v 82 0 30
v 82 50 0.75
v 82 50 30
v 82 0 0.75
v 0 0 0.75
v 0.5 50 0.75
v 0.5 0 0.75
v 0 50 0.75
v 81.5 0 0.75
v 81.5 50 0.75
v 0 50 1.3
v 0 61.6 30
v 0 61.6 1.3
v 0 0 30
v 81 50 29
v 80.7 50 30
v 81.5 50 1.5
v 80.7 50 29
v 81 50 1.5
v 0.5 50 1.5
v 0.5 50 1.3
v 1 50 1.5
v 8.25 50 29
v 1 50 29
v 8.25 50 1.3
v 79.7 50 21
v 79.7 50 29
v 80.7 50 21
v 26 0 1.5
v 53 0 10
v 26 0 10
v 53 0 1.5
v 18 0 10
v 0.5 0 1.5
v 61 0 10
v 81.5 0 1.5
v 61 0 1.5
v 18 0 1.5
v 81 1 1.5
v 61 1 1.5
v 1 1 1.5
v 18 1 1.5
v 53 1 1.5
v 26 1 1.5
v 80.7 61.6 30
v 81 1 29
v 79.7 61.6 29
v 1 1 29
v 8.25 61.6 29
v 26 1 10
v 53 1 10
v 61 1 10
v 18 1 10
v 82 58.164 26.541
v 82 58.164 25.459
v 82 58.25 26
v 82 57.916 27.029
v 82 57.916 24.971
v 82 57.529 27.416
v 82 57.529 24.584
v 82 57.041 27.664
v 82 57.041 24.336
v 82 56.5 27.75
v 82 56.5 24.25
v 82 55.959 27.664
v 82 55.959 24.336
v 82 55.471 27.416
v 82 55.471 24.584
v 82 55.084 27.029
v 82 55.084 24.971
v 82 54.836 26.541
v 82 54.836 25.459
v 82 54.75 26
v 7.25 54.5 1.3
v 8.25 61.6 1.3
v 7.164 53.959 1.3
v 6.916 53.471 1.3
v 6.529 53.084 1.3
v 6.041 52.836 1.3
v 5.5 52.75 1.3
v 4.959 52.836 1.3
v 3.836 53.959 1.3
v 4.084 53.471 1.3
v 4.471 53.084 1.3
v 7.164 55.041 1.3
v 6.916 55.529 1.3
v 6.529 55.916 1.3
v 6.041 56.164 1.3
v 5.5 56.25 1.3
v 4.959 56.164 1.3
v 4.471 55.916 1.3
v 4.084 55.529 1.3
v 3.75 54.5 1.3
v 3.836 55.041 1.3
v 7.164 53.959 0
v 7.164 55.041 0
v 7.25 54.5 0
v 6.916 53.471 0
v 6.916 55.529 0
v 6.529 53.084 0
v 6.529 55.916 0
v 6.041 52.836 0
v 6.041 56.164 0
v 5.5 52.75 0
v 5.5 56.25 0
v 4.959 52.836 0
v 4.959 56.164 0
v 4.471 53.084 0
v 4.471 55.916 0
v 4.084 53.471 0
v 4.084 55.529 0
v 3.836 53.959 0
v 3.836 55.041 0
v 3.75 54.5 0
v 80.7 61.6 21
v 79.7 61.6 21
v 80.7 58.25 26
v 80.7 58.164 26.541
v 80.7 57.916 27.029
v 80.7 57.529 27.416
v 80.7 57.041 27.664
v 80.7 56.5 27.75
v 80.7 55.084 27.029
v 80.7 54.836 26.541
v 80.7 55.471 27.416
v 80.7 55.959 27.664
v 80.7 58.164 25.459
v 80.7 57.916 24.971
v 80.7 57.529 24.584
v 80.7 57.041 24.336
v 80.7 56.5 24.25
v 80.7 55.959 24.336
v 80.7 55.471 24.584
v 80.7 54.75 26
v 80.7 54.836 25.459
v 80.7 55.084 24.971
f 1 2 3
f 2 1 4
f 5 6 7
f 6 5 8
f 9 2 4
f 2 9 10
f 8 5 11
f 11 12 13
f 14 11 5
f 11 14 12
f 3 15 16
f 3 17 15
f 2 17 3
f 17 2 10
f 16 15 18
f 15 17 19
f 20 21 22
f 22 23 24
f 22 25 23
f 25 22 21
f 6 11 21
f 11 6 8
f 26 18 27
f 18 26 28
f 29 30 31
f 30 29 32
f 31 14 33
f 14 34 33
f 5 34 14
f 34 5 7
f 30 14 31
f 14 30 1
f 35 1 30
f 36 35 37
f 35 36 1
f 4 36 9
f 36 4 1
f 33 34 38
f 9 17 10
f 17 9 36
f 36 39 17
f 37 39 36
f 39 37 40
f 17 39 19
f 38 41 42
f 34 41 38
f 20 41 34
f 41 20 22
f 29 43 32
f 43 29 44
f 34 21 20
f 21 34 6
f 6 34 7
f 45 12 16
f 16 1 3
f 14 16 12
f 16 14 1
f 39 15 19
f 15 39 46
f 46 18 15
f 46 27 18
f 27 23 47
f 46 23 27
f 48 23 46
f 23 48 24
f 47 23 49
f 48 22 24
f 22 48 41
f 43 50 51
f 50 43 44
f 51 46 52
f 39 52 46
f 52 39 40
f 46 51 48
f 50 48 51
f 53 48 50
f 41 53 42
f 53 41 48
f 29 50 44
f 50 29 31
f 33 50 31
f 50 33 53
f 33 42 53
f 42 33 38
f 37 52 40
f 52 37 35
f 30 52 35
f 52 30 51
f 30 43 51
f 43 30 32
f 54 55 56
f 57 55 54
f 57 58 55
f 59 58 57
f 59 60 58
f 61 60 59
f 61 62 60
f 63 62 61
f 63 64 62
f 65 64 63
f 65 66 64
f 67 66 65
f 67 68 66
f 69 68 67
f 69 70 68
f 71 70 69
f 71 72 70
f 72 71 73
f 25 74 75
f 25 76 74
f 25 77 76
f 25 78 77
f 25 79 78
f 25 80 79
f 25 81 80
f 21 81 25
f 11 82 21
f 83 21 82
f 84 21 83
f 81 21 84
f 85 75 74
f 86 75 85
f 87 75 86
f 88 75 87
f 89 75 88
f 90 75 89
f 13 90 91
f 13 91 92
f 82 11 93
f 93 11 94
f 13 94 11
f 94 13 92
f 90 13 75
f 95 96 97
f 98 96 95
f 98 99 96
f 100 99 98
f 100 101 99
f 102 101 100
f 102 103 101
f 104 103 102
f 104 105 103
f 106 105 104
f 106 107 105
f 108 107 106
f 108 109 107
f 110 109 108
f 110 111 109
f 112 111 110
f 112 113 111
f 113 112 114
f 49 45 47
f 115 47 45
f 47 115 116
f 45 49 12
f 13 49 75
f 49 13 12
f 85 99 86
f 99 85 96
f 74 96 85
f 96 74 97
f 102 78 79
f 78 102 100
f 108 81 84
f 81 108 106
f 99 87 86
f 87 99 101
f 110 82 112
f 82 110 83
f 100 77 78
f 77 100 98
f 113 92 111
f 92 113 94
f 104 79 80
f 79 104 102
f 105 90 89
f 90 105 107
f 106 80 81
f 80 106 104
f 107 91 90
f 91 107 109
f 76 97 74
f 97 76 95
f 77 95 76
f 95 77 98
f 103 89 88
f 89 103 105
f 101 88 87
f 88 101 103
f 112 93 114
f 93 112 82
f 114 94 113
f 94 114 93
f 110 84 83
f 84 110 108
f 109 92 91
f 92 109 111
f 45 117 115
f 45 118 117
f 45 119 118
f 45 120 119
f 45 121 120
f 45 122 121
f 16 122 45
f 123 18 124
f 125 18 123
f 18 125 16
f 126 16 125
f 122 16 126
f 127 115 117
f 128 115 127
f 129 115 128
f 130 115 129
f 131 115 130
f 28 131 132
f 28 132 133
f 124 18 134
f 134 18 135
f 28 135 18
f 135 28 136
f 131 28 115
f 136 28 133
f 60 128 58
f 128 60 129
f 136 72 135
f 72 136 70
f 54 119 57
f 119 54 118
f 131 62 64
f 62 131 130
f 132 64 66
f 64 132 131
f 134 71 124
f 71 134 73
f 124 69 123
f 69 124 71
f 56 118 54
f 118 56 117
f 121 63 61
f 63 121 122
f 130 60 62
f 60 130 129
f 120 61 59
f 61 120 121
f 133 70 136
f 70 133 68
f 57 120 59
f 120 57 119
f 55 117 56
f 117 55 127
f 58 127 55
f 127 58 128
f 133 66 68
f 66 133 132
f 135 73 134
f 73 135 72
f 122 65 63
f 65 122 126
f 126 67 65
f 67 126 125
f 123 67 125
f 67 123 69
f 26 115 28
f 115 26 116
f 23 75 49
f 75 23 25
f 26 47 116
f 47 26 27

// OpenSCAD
// file: module-definitions.scad
include <definitions.scad>

/* Exposed part of the PSU */
module exposed_psu(){
	difference(){
		cube([psu_x, psu_y, psu_z_thick], center=false);
		translate([psu_x-base_hole_x,base_hole_y,-0.1]){
			cylinder(psu_z_thick+0.2,r=base_hole_r);
		}
	}

	difference(){
		translate([psu_x-psu_x_thick, 0, 0]){
			cube([psu_x_thick, psu_y, psu_z], center=false);
		}
		translate([psu_x-psu_x_thick-0.1, wall_hole_y, wall_hole_z]){
			rotate([0,90,0]){
				cylinder(psu_z_thick+0.2,r=base_hole_r);
			}
		}
	}
}
/* End of exposed part of PSU */

/* Base of PSU cover that is printed separately */
module cover_base(){
	cube([psu_x, cover_extra_y, empty_base_wall_thick/2]);
	translate([empty_wall_thick/2, 0, empty_base_wall_thick/2]){
        	cube([psu_x - empty_wall_thick, cover_extra_y, empty_base_wall_thick/2]);
	}
}
/* End of PSU cover base */
// file: definitions.scad
$fn=20;

//Measurements of the open part of the PSU with screw terminals
psu_x = 82;
psu_y = 11.6;
psu_z = 30;

//Set thickness of vertical wall on side of PSU
psu_x_thick = 1.3;

//Placeholder for base thickness
psu_z_thick = 1.3;

//Location of holes used for holding this cover
base_hole_x = 76.5;
base_hole_y = 4.5;
base_hole_r = 1.75;

wall_hole_y = 6.5;
wall_hole_z = 26;
wall_hole_r = 1.75;

//Variable for extra y distance
cover_extra_y = 50;

//Variables relating to the exposed PSU section of the cover
wall_z_extend = wall_hole_z - 5;
wall_x_extend = psu_x - base_hole_x + base_hole_r + 1;
wall_vert_thick = 1;
wall_top_thick = 1;
vert_tab_clear = 2;

//Variables relating to the empty section of the cover
empty_wall_thick = 1;
empty_base_wall_thick = 1.5;

mains_cable_cut_x = 18;
mains_cable_cut_y = 0;
mains_cable_cut_z = 0;
mains_cable_cut_x_thick = 8;
mains_cable_cut_z_thick = 10;

led_cable_cut_x = mains_cable_cut_x + 35;
led_cable_cut_y = 0;
led_cable_cut_z = 0;
led_cable_cut_x_thick = 8;
led_cable_cut_z_thick = 10;

//Derived variables
cover_x = psu_x;
cover_y = cover_extra_y + psu_y;
cover_z = psu_z;
// main file
include <definitions.scad>
include <module-definitions.scad>

/* Back part of the enclosure containing the switch and LED driver*/
difference(){
	cube([cover_x, cover_extra_y, cover_z], center = false);

	translate([empty_wall_thick, empty_wall_thick, empty_base_wall_thick]){
		cube([psu_x - 2 * empty_wall_thick, cover_extra_y - empty_wall_thick,
			psu_z - empty_wall_thick - empty_base_wall_thick]);
	}
	//Make the hole for the mains cables
	translate([mains_cable_cut_x, mains_cable_cut_y, mains_cable_cut_z]){
		cube([mains_cable_cut_x_thick, empty_wall_thick, mains_cable_cut_z_thick]);
	}
	//Make the hole for the low side power cables
	translate([led_cable_cut_x, led_cable_cut_y, led_cable_cut_z]){
		cube([led_cable_cut_x_thick, empty_wall_thick, led_cable_cut_z_thick]);
	}

	//Carve out the base that will be printed separately
	cover_base();
}
/* End of back part of the enclosure */

/* Cover for the exposed part of the enclosure */
difference(){
	translate([0, cover_extra_y, 0]){
		cube([cover_x, psu_y, cover_z], center = false);
	}
	translate([0, cover_extra_y, 0]){
		exposed_psu();
	}

	/* This section deals with the exposed PSU part of the enclosure */
	//Form the bottom z-section
	translate([wall_x_extend, cover_extra_y, 0]){
		cube([psu_x - wall_vert_thick - wall_x_extend, psu_y, wall_z_extend], center=false);
	}
	//Form the top z-section
	translate([wall_x_extend, cover_extra_y, wall_z_extend]){
		cube([psu_x - wall_vert_thick - psu_x_thick - wall_x_extend,
			psu_y, psu_z - wall_z_extend - wall_top_thick], center=false);
	}
	//Detach the vertical mounting point to allow it to flex
	//translate([psu_x - psu_x_thick - wall_vert_thick, cover_extra_y, wall_z_extend]){
	//	cube([wall_vert_thick, vert_tab_clear, psu_z - wall_z_extend - wall_top_thick], center = false);
	//}
	/* End of exposed PSU part of enclosure */
}
